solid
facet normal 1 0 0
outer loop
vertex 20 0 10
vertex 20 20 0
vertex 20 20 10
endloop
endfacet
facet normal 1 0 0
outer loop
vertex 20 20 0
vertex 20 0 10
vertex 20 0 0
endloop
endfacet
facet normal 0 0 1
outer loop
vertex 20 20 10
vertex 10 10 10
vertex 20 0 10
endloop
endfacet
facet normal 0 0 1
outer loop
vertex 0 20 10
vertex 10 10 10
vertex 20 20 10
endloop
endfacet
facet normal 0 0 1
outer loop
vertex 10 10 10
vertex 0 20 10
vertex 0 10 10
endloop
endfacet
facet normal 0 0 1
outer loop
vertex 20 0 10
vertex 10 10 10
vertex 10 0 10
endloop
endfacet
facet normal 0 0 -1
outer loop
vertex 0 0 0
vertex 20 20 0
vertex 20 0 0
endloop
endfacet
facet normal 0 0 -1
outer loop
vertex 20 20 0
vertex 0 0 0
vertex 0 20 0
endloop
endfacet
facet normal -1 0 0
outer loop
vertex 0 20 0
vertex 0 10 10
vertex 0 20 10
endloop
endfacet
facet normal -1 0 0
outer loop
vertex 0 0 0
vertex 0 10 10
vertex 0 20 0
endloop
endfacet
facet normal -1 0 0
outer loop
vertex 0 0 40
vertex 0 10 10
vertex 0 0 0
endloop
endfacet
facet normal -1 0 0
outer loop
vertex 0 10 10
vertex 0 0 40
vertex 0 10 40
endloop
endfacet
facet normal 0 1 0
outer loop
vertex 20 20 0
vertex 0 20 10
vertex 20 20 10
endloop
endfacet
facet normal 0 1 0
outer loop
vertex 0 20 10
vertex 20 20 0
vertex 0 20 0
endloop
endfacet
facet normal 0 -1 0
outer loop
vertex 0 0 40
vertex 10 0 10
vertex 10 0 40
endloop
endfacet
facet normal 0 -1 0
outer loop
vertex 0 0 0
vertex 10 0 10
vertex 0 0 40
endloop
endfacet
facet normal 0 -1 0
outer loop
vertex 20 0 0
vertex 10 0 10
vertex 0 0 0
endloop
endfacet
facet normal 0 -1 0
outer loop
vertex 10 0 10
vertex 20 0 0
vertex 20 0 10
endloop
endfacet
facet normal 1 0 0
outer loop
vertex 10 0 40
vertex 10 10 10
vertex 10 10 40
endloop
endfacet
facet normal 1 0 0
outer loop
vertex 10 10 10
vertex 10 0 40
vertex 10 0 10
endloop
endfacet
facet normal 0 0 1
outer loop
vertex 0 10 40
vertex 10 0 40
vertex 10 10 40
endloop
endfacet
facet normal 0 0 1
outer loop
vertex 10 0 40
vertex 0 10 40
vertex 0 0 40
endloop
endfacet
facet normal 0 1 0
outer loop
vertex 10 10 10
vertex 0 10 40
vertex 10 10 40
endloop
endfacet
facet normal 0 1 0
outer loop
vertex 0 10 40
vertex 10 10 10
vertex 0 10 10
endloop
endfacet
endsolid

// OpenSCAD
width=20;
// @PROVENANCE@
module smx_insert_item_1() {
cube(size = [10, 10, 30], center = false);
}
union() {
cube([width,20,10]);
    // Fixed local placement.
    translate([0, 0, 10])
        smx_insert_item_1();
}
